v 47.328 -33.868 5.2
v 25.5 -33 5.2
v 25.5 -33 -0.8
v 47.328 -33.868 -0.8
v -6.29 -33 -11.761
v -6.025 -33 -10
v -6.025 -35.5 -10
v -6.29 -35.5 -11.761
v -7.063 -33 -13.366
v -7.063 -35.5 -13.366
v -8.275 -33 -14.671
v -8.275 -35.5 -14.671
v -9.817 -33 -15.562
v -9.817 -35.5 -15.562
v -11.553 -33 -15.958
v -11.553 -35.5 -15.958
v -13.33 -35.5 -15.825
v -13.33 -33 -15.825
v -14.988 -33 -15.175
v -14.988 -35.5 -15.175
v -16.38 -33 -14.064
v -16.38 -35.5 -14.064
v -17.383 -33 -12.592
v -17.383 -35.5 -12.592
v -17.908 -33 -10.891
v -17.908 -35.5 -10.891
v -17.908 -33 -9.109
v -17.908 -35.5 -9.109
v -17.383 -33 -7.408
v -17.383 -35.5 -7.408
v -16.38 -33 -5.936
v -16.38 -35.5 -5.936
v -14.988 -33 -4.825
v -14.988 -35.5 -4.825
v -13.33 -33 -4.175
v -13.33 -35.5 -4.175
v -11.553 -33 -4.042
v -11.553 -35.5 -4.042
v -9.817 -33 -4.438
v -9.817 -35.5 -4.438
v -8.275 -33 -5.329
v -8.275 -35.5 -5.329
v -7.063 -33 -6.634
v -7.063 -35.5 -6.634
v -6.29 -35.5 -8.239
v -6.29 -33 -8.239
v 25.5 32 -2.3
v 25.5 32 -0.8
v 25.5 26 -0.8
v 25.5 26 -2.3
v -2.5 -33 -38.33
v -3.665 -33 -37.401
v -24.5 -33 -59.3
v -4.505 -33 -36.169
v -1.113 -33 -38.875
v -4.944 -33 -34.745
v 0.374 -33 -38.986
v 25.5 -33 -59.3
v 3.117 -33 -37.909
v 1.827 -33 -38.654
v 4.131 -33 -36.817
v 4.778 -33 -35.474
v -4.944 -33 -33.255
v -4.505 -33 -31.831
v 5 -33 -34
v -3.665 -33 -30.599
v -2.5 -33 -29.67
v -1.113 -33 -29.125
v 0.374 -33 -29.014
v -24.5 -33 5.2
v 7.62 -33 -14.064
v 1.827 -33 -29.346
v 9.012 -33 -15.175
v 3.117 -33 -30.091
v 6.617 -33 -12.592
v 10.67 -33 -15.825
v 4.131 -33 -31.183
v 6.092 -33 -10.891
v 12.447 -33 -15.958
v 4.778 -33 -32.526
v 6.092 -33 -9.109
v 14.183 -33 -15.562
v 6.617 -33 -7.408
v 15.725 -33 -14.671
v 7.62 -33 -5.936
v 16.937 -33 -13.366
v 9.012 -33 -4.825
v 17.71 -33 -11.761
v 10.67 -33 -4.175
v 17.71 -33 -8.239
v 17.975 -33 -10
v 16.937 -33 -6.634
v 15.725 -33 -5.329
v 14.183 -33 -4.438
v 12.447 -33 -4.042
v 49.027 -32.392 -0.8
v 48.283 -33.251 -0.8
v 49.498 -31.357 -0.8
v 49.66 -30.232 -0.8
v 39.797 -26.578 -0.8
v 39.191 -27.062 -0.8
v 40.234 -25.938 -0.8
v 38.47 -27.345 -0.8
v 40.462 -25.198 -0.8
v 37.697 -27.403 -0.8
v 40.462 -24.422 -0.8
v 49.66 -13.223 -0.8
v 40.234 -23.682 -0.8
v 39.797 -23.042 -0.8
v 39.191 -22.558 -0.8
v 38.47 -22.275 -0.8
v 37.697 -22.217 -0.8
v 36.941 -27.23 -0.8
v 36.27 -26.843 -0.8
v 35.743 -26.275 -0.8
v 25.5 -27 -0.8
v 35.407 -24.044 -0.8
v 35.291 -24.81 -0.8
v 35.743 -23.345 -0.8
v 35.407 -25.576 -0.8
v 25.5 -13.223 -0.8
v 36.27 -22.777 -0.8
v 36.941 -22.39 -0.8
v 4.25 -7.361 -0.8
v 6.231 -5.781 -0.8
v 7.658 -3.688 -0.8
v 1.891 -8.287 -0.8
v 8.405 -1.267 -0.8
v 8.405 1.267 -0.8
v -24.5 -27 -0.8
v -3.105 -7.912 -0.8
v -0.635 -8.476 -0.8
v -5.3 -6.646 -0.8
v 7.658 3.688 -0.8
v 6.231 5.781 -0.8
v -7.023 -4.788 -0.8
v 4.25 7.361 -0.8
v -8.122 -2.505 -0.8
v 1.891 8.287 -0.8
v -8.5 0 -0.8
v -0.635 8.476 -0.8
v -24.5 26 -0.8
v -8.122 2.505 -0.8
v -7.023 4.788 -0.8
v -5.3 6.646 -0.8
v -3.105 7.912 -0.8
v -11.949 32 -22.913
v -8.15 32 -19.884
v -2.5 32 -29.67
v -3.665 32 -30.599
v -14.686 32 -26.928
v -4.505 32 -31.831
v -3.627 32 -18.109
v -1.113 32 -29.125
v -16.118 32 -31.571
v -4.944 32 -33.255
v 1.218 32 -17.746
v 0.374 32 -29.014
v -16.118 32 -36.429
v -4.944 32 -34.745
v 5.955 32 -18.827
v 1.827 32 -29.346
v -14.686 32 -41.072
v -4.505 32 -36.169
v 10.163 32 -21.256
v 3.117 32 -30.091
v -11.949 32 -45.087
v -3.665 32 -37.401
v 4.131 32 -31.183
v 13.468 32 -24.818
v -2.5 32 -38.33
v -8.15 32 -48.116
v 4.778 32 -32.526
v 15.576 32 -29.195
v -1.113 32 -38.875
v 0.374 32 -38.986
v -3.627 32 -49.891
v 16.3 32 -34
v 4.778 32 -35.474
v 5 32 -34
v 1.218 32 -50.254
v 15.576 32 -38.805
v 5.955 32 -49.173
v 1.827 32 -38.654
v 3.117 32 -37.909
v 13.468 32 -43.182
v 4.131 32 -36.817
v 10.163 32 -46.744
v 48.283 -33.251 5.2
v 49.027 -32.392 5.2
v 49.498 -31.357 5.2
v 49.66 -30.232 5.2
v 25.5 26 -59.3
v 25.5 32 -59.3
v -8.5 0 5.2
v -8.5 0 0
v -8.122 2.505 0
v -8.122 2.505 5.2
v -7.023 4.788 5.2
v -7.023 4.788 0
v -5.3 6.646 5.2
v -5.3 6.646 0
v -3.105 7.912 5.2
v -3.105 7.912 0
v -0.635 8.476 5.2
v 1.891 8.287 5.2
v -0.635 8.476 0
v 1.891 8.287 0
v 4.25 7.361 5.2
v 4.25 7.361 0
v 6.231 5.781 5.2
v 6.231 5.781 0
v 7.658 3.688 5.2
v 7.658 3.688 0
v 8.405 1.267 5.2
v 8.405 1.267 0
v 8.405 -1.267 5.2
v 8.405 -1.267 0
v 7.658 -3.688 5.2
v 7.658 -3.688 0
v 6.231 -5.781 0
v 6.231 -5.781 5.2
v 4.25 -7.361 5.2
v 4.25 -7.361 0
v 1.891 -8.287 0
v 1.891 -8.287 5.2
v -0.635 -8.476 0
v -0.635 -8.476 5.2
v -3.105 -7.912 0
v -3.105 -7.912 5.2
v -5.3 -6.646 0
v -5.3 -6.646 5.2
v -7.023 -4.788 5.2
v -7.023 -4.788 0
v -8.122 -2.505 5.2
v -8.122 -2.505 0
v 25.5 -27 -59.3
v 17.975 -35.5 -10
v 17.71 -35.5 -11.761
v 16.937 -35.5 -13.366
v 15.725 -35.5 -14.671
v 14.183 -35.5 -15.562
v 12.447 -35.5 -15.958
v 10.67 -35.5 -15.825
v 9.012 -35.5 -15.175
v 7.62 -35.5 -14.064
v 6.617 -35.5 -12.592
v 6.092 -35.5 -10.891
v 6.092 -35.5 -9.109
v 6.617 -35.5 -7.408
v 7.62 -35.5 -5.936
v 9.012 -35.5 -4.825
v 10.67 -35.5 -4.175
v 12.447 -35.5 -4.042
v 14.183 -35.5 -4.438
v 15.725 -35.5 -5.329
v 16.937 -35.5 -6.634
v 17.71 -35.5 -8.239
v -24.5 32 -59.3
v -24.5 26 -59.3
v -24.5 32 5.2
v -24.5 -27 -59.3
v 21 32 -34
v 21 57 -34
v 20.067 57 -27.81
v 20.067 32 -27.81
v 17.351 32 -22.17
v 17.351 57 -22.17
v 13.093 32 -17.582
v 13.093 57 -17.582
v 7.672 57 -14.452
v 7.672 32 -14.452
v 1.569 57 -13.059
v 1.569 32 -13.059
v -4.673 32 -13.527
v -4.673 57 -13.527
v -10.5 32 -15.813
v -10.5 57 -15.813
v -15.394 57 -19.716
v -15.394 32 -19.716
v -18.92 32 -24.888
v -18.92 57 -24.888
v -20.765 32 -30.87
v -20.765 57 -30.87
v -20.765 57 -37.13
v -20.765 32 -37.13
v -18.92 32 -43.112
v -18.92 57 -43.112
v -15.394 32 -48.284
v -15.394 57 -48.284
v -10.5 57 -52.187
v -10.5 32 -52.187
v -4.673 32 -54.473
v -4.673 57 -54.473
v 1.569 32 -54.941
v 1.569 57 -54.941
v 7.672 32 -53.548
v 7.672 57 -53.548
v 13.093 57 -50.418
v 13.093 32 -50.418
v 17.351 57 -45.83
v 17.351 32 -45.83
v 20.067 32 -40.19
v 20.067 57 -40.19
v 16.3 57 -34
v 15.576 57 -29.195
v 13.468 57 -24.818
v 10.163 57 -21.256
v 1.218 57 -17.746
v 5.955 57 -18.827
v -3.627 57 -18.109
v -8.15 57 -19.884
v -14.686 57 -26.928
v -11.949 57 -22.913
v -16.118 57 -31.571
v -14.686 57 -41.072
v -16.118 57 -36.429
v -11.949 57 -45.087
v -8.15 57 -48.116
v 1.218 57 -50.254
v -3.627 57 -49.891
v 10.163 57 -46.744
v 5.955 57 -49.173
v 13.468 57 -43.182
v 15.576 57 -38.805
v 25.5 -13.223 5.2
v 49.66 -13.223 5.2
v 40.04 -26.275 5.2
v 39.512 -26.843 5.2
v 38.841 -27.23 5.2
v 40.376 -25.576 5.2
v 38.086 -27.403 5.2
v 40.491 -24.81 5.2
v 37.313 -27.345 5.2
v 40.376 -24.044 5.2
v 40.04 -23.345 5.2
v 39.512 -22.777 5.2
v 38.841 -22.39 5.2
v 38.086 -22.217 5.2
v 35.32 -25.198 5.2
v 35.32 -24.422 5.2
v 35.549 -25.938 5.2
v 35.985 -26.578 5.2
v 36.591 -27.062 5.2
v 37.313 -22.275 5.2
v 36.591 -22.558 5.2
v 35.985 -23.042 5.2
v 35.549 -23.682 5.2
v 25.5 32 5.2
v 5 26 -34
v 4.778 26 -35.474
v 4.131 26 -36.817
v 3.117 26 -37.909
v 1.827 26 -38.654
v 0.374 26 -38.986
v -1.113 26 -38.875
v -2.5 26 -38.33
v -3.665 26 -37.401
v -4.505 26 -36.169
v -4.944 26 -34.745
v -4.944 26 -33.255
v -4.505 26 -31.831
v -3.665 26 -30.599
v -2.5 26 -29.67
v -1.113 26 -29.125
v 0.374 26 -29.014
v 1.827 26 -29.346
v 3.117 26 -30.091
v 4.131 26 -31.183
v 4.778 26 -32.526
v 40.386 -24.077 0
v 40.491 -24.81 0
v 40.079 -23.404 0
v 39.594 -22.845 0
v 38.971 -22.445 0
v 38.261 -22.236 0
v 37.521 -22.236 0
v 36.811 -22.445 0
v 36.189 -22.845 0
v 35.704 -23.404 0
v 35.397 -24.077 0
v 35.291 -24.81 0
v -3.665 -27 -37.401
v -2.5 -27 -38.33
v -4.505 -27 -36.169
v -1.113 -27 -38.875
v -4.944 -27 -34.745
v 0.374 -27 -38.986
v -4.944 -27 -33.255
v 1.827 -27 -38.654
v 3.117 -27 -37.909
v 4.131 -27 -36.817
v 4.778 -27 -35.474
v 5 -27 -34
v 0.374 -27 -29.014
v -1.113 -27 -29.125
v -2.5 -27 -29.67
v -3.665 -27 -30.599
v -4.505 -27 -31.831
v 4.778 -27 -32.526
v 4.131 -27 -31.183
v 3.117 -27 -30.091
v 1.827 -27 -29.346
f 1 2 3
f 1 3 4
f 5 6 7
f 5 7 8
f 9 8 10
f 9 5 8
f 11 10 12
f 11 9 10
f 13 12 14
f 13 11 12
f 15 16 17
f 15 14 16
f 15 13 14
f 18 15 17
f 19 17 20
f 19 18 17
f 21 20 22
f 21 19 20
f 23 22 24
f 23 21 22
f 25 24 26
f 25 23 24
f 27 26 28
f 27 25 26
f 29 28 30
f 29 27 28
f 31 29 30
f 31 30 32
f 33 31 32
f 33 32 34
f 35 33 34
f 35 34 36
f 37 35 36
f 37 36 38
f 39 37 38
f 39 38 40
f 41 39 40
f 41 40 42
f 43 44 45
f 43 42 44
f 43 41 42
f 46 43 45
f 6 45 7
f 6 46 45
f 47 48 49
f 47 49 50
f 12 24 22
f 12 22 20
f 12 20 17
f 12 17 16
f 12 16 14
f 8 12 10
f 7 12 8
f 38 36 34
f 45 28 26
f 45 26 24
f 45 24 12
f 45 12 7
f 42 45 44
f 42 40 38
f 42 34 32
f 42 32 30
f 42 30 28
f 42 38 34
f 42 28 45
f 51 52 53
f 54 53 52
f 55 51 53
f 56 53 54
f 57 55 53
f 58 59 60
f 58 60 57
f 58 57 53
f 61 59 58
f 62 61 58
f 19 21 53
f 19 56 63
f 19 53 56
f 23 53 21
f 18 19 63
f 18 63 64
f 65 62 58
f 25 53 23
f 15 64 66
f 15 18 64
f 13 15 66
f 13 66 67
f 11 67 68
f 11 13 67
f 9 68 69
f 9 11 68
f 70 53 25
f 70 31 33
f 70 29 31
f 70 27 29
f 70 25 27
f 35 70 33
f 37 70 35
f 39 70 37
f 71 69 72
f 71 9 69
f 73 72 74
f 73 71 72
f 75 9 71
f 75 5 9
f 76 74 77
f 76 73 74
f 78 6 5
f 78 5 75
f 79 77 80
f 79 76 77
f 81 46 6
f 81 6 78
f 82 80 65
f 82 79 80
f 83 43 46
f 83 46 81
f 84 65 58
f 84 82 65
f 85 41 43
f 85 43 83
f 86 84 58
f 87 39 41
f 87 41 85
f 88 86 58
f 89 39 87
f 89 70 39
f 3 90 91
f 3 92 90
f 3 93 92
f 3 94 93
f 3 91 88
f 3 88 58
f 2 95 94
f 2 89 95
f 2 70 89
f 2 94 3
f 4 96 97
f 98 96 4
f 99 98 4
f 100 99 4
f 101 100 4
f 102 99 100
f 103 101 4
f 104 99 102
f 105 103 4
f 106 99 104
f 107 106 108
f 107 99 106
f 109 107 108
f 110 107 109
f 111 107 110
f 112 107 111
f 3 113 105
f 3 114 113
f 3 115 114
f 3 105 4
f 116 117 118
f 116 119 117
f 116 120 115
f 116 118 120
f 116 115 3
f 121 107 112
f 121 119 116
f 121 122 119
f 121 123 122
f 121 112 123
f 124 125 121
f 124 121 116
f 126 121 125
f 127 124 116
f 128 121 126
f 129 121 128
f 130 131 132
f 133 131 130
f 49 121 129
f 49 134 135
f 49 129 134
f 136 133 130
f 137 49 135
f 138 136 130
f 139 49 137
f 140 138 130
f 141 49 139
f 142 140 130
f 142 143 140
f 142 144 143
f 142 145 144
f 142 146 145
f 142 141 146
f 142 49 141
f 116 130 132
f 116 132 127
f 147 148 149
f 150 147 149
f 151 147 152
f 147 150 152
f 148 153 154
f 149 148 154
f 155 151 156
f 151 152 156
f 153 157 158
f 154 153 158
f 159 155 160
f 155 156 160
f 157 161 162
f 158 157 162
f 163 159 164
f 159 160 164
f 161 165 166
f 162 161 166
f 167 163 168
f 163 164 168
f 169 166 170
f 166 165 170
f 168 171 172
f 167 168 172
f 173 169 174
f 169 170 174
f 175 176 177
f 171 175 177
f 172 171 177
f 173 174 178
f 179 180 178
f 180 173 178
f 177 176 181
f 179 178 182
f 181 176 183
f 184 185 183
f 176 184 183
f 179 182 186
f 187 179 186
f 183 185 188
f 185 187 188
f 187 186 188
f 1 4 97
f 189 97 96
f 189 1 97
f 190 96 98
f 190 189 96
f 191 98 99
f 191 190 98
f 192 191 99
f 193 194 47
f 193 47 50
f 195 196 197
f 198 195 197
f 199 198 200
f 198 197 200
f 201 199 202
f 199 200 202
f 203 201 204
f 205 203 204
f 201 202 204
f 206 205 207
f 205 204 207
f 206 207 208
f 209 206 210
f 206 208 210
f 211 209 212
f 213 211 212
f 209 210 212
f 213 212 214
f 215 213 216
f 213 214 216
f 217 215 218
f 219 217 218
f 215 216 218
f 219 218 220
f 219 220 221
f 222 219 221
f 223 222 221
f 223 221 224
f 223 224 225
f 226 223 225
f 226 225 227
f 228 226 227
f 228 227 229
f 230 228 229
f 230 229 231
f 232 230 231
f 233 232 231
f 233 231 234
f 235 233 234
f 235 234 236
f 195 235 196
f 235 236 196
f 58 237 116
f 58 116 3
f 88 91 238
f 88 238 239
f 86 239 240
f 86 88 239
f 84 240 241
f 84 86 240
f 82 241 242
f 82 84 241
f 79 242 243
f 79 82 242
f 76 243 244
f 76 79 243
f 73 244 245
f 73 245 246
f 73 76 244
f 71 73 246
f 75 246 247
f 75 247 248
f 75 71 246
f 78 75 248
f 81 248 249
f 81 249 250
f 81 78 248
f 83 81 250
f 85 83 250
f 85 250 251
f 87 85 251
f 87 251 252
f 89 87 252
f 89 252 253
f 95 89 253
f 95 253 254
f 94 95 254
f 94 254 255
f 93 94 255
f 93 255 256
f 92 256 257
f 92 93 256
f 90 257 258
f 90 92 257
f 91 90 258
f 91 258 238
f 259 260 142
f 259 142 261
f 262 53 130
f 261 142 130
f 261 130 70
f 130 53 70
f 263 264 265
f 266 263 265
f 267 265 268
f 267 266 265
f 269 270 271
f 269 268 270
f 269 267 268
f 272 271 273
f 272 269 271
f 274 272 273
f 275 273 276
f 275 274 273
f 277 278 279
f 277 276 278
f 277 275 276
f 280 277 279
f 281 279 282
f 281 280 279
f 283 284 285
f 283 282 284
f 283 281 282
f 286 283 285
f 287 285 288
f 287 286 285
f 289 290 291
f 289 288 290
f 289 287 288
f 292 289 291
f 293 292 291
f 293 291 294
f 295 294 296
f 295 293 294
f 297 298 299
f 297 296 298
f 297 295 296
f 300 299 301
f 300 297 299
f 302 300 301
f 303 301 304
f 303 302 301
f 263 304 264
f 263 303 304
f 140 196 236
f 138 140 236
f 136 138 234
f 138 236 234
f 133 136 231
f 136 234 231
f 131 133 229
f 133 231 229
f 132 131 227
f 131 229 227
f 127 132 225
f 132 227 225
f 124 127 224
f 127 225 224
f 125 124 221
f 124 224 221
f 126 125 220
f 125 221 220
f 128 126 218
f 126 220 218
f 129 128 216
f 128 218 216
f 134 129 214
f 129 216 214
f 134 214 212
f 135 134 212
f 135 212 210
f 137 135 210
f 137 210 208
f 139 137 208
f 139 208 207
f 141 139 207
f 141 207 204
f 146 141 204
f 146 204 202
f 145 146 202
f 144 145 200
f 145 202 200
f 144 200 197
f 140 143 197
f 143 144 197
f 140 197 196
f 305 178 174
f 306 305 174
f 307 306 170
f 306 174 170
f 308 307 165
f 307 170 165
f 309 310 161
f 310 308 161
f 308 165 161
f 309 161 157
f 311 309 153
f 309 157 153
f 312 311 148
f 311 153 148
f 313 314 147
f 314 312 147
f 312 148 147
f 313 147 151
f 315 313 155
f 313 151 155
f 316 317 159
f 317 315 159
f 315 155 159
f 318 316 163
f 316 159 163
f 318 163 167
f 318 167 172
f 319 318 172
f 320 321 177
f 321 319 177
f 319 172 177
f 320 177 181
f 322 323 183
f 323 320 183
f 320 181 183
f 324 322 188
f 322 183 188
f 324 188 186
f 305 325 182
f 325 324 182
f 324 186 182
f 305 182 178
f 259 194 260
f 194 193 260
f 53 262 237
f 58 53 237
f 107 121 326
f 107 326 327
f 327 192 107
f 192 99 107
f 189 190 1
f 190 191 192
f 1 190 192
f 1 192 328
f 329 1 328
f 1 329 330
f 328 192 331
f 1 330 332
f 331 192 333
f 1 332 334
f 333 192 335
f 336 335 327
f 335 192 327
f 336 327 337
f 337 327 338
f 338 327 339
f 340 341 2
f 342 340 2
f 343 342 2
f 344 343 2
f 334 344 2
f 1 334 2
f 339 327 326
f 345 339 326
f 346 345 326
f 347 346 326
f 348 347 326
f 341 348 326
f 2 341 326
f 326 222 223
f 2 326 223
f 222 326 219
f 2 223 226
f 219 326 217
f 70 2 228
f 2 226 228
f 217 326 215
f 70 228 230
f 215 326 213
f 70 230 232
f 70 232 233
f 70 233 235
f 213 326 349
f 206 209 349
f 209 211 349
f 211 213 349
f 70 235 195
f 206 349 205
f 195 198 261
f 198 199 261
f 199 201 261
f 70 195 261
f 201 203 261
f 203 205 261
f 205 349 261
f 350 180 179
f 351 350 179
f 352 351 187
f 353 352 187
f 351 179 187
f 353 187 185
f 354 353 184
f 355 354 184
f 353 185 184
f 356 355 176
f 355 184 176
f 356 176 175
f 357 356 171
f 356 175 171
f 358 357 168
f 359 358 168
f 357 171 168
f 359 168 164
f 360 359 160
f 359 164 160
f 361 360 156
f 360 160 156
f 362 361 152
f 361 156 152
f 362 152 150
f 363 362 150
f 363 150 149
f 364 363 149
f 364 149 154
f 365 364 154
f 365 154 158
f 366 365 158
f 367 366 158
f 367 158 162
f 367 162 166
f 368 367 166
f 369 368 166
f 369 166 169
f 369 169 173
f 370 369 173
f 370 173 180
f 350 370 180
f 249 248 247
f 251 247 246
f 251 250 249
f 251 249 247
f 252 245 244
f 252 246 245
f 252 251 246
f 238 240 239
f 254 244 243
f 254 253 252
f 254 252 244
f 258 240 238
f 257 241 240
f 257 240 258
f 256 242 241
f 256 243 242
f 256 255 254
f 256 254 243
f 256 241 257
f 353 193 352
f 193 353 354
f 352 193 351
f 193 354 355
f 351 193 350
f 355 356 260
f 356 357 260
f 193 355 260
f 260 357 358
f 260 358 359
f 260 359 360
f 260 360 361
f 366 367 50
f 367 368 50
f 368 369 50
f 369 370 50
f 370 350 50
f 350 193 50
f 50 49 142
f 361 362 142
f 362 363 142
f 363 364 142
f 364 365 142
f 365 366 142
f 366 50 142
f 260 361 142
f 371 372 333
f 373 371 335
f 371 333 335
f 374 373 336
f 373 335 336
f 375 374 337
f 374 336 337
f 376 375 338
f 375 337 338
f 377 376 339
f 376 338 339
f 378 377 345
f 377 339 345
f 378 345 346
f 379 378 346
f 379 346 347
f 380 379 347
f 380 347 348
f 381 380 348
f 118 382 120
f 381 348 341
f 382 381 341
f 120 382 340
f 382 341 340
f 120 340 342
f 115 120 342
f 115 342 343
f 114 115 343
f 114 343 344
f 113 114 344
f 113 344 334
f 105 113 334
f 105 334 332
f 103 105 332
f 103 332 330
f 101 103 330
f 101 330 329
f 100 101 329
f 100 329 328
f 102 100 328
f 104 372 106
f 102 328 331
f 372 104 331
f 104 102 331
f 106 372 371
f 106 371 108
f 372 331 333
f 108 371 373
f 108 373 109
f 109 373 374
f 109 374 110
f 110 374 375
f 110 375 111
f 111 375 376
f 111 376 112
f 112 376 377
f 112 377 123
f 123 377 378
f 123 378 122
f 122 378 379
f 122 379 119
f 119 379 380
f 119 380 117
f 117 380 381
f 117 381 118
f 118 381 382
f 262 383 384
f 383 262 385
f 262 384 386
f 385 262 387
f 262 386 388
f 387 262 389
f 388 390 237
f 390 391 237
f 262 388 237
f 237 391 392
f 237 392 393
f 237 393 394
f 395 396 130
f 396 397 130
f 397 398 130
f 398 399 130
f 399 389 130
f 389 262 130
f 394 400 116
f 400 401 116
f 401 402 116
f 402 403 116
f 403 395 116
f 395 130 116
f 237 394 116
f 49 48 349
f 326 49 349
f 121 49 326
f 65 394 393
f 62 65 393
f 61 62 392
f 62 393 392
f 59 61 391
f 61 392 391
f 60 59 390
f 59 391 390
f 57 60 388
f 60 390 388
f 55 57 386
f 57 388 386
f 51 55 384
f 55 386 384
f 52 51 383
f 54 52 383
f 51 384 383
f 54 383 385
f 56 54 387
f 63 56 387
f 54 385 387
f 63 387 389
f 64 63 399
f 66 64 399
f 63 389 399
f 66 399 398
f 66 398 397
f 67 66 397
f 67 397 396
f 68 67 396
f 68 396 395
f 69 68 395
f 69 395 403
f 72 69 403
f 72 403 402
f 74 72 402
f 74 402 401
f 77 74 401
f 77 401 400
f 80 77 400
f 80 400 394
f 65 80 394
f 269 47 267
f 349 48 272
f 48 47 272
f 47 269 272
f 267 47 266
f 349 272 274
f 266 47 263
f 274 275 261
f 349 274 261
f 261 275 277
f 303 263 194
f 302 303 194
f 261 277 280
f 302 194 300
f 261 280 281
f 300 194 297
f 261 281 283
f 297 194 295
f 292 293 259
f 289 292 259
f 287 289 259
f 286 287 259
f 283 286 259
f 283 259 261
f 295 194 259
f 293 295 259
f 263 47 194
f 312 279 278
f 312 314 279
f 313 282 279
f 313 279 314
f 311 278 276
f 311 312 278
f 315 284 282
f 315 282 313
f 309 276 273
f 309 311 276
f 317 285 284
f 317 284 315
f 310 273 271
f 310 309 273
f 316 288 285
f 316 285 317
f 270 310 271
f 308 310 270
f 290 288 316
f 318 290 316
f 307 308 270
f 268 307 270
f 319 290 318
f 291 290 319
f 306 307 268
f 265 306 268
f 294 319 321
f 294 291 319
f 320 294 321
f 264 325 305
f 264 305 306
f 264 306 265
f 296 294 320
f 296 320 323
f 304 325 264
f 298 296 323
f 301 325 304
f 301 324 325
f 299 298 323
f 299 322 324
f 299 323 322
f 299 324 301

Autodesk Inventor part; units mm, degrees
sketch "Sketch1" plane through (0, 0, 0) normal (0, 0, 1) x (1, 0, 0)
  line L0 (25.5, -27) -> (-25.5, -27)
  line L1 (-25.5, -27) -> (-25.5, 27)
  line L2 (-25.5, 27) -> (25.5, 27)
  line L3 (25.5, 27) -> (25.5, -27)
  line L4 (25.5, -27) -> (-25.5, 27) construction
  line L5 (-25.5, -27) -> (25.5, 27) construction
  point P0 (0, 0)
  dimension "d0" = 51
  dimension "d1" = 54
extrude "Extrusion1" add sketch "Sketch1" along normal blind 6
sketch "Sketch2" plane through (0, 0, 6) normal (0, 0, 1) x (1, 0, 0)
  circle A0 centre (0, 0) radius 15
  dimension "d4" = 30
sketch "Sketch4" plane through (0, 0, 6) normal (0, 0, 1) x (1, 0, 0)
  line L0 (-25.5, 27) -> (26.5, 27)
  line L1 (-25.5, -27) -> (25.5, -27) projected
  line L2 (25.5, -27) -> (-25.5, -27)
  line L3 (-25.5, -27) -> (-25.5, -33)
  line L4 (-25.5, -33) -> (25.5, -33)
  line L5 (25.5, -33) -> (25.5, -27)
  point P0 (0, 0)
  dimension "d109" = 51
  dimension "d110" = 6
extrude "Extrusion4" add sketch "Sketch4" against normal blind 65.3
ref_plane "Plano de trabajo8" through (25.5, -33.8, -42) normal (1, 0, 0) x (0, 0, -1)
ref_plane "Work Plane9" through (-10.5, -27, -57) normal (0, 1, 0) x (1, 0, 0)
sketch "Sketch25" plane through (-10.5, -27, -57) normal (0, 1, 0) x (1, 0, 0)
  line L0 (0, 0) -> (21, 0) projected
  line L1 (10.5, 0) -> (10.5, -23)
  circle A0 centre (10.5, -23) radius 5
  line L2 (10.5, -23) -> (10.5, -63)
  line L3 (36, -63) -> (-15, -63) projected
  point P0 (10.5, -57)
  dimension "d111" = 23
  dimension "d112" = 10
extrude "Extrusion22" cut sketch "Sketch25" against normal blind 68
ref_plane "Work Plane7" through (-10.5, -0.5, -57) normal (0, 1, 0) x (1, 0, 0)
mirror "Mirror2" about plane through (-10.5, -0.5, -57) normal (0, 1, 0) of "Extrusion4"
extrude "Extrusión28" cut sketch "Sketch2" against normal blind 10
ref_plane "Work Plane10" through (25.5, -34, -42) normal (1, 0, 0) x (0, 0, -1)
ref_plane "Work Plane11" through (-25.5, -87, 1.3) normal (0, 1, 0) x (1, 0, 0)
sketch "Sketch37" plane through (-25.5, 32, 6) normal (0, 1, 0) x (1, 0, 0)
  circle A0 centre (25.5, 40) radius 5 projected
  point P0 (25.5, 6)
extrude "Extrusion33" cut sketch "Sketch37" against normal blind 68
sketch "Sketch43" plane through (0, 0, 6) normal (0, 0, 1) x (1, 0, 0)
  circle A0 centre (0, 0) radius 10.4895
  circle A1 centre (0, 0) radius 15 projected
  circle A2 centre (0, 0) radius 5
  dimension "d182" = 10
extrude "Extrusion40" add sketch "Sketch43" against normal blind 8.3 contours A0 | A1
sketch "Boceto48" plane through (-25.5, -33, 6) normal (0, -1, 0) x (1, 0, 0)
  point P0 (25.5, -6)
sketch "Boceto49" plane through (-25.5, -33, 6) normal (0, -1, 0) x (1, 0, 0)
  point P0 (25.5, -6)
sketch "Boceto50" plane through (25.5, 26, -59.3) normal (0, 0, -1) x (-1, 0, 0)
  point P0 (25.5, -26)
sketch "Boceto77" plane through (0, 0, 6) normal (0, 0, 1) x (1, 0, 0)
  point P0 (0, 0)
sketch "Boceto84" plane through (25.5, -33, -59.3) normal (1, 0, 0) x (0, 0, -1)
  line L0 (-65.3, 0) -> (-65.3, 65) projected
  line L1 (-65.3, 0) -> (-65.3, 32.3804)
  line L2 (-65.3, 32.3804) -> (-80.5662, 32.3804)
  line L3 (-80.5662, 32.3804) -> (-80.5662, -6.9517)
  line L4 (-80.5662, -6.9517) -> (-65.3, -6.9517)
  line L5 (-65.3, -6.9517) -> (-65.3, 0)
  point P0 (-59.3, 33)
  point P1 (-65.3, 66.9563)
  point P2 (-65.3, 65.9563)
extrude "Extrusión80" cut sketch "Boceto84" along normal mid plane 100
sketch "Boceto85" plane through (0, 0, 0) normal (0, 0, -1) x (-1, 0, 0)
  line L0 (-25.5, -33) -> (-25.5, -4.0448)
  line L1 (-25.5, -27) -> (-25.5, 26) projected
  line L2 (-25.5, -4.0448) -> (-53.9802, -4.6672)
  line L3 (-53.9802, -4.6672) -> (-54.6281, -33.6366)
  line L4 (-54.6281, -33.6366) -> (-25.5, -33)
  point P0 (0, 0)
  point P1 (-25.5, -13.7947)
extrude "Extrusión81" cut sketch "Boceto85" along normal mid plane 100
sketch "Boceto90" plane through (0, 0, 6) normal (0, 0, 1) x (1, 0, 0)
  circle A0 centre (0, 0) radius 5.2249
  circle A1 centre (0, 0) radius 14.4421
extrude "Extrusión86" add sketch "Boceto90" along normal blind 4.7
fillet "Empalme20" radius 2 1 edges at (-14.4421, 0, 6)
sketch "Boceto91" plane through (0, 0, 0) normal (0, 0, -1) x (-1, 0, 0)
  point P0 (0, 0)
sketch "Boceto92" plane through (0, 0, 0) normal (0, 0, -1) x (-1, 0, 0)
  point P0 (0, 0)
sketch "Boceto93" plane through (0, 0, 0) normal (0, 0, -1) x (-1, 0, 0)
  line L0 (-25.5, -27) -> (-25.5, 26) projected
  line L1 (-25.5, 1.3668) -> (-41.5813, 1.3668)
  line L2 (-41.5813, 1.3668) -> (-41.5813, -33)
  line L3 (-25.5, -33) -> (-41.5813, -33)
  line L4 (-25.5, -33) -> (-25.5, 32.9563) projected
  line L5 (-25.5, 1.3668) -> (-25.5, -33)
  point P0 (0, 0)
extrude "Extrusión87" add sketch "Boceto93" against normal blind 8.3
sketch "Boceto94" plane through (0, 0, 6) normal (0, 0, 1) x (1, 0, 0)
  line L0 (41.5813, -33) -> (41.5813, 1.3668) projected
  line L1 (41.5813, 1.3668) -> (41.5813, 35.5236)
  line L2 (-25.5, 32.9563) -> (25.5, 32.9563) projected
  line L3 (25.5, 32.9563) -> (41.5813, 32.9563)
  line L4 (25.5, 32.9563) -> (25.5, 1.3668)
  line L5 (25.5, 1.3668) -> (41.5813, 1.3668)
  point P0 (0, 0)
extrude "Extrusión88" add sketch "Boceto94" against normal blind 8.3
sketch "Boceto95" plane through (0, 0, 6) normal (0, 0, 1) x (1, 0, 0)
  circle A0 centre (37.8913, -24.81) radius 2.6
  line L0 (35.2913, -24.81) -> (37.8913, -24.81)
  point P0 (0, 0)
  point P1 (41.5813, -33)
  dimension "d305" = 5.2
extrude "Extrusión89" cut sketch "Boceto95" against normal blind 8.3
sketch "Boceto97" plane through (-25.5, -33, -59.3) normal (-1, 0, 0) x (0, 0, 1)
  line L0 (59.3, 0) -> (67.6, 0) projected
  line L1 (67.6, 0) -> (89.1392, 0)
  line L2 (89.1392, 0) -> (89.1392, 69.8717)
  line L3 (89.1392, 69.8717) -> (67.6, 69.8717)
  line L4 (67.6, 69.8717) -> (67.6, 0)
  point P0 (59.3, 33)
extrude "Extrusión92" cut sketch "Boceto97" against normal blind 1000
sketch "Boceto98" plane through (-25.5, -33, -59.3) normal (-1, 0, 0) x (0, 0, 1)
  line L0 (59.3, 59) -> (59.3, 6) projected
  line L1 (59.3, 59) -> (58.3, 59) projected
  line L2 (59.3, 6) -> (59.3, 59)
  line L3 (59.3, 59) -> (56.1979, 59)
  line L4 (59.3, 59) -> (0, 59) projected
  line L5 (56.1979, 59) -> (56.1979, 6)
  line L6 (59.3, 6) -> (0, 6) projected
  line L7 (56.1979, 6) -> (59.3, 6)
  line L8 (65.3, 65) -> (0, 65) projected
  line L9 (56.1979, 65) -> (56.1979, 67.4992)
  line L10 (56.1979, 67.4992) -> (67.7631, 67.4992)
  line L11 (67.7631, 67.4992) -> (76.364, 67.4992)
  line L12 (76.364, 67.4992) -> (76.364, -7.6447)
  line L13 (65.3, 0) -> (65.3, 34.3668) projected
  line L14 (65.3, 0) -> (65.3, -7.6447)
  line L15 (65.3, -7.6447) -> (76.364, -7.6447)
  line L16 (65.3, 0) -> (65.3, 65)
  line L17 (65.3, 0) -> (65.3, 65) projected
  line L18 (56.1979, 65) -> (65.3, 65)
  point P0 (59.3, 33)
  point P1 (59.3, 51.8098)
  point P2 (58.3, 65)
  point P3 (65.3, 65.9563)
  point P4 (59.3, 51.8098)
  point P5 (58.3, 65)
  point P6 (65.3, 34.3668)
extrude "Extrusión93" cut sketch "Boceto98" along normal mid plane 1000
sketch "Boceto99" plane through (41.5813, -33, 0) normal (1, 0, 0) x (0, 0, -1)
  line L0 (0, 58.9816) -> (2.3, 58.9816)
  line L1 (2.3, 65) -> (2.3, 59) projected
  line L2 (2.3, 58.9816) -> (2.3, 65)
  line L3 (2.3, 65) -> (2.3, 58.9816)
  line L4 (2.3, 65) -> (0, 65)
  line L5 (-6, 65) -> (59.3, 65) projected
  line L6 (0, 58.9816) -> (0, 65)
  point P0 (0, 33)
extrude "Extrusión94" cut sketch "Boceto99" against normal blind 16.081
sketch "Boceto100" plane through (25.5, 26, -59.3) normal (0, 0, -1) x (-1, 0, 0)
  line L0 (-16.0813, 6) -> (-0.0003, 6) projected
  line L1 (0, 0) -> (-16.0813, 0)
  line L2 (-16.0813, 0) -> (-16.0813, 6)
  line L3 (-16.0813, 6) -> (0, 6)
  line L4 (0, 6) -> (0, 0)
  point P0 (25.5, -26)
  point P1 (-0.0003, 6)
extrude "Extrusión95" cut sketch "Boceto100" against normal blind 59.3
sketch "Boceto101" plane through (0, 0, 0) normal (0, 0, -1) x (-1, 0, 0)
  circle A0 centre (0, 0) radius 8.5
  dimension "d322" = 17
extrude "Extrusión96" cut sketch "Boceto101" against normal blind 59.3
sketch "Boceto102" plane through (-25.5, 32, -59.3) normal (0, 1, 0) x (1, 0, 0)
  circle A0 centre (25.5, -25.3) radius 5 projected
  circle A1 centre (25.5, -25.3) radius 16.3
  circle A2 centre (25.5, -25.3) radius 21
  point P0 (25.5, -59.3)
  dimension "d325" = 32.6
  dimension "d326" = 42
extrude "Extrusión97" add sketch "Boceto102" along normal blind 25 contours A2
sketch "Boceto103" plane through (-25.5, -27, -59.3) normal (0, 1, 0) x (1, 0, 0)
  point P0 (25.5, -59.3)
sketch "Boceto104" plane through (0, 0, 6) normal (0, 0, 1) x (1, 0, 0)
  line L0 (-25.5, -33) -> (-25.5, 32) projected
  line L1 (41.5813, 32) -> (41.5813, -33) projected
  line L2 (-25.5, 32) -> (41.5813, 32)
  line L3 (41.5813, 32) -> (41.5813, -33)
  line L4 (41.5813, -33) -> (-25.5, -33)
  line L5 (-25.5, -33) -> (-25.5, 32)
  point P0 (0, 0)
extrude "Extrusión98" cut sketch "Boceto104" against normal blind 0.8
sketch "Boceto105" plane through (0, 0, 0) normal (0, 0, -1) x (-1, 0, 0)
  line L0 (-25.5, -33) -> (25.5, -33) projected
  line L1 (-41.5813, 32) -> (25.5, 32)
  line L2 (25.5, 32) -> (25.5, -33)
  line L3 (25.5, -33) -> (-41.5813, -33)
  line L4 (-41.5813, -33) -> (-41.5813, 32)
  circle A0 centre (-37.8913, -24.81) radius 2.6 projected
  circle A1 centre (-37.8913, -24.81) radius 2.6
  circle A2 centre (0, 0) radius 8.5
extrude "Extrusión99" add sketch "Boceto105" along normal blind 0.8
sketch "Boceto106" plane through (-25.5, -33, -59.3) normal (0, -1, 0) x (1, 0, 0)
  line L0 (0, 0) -> (51, 0) projected
  line L1 (67.0813, 64.5) -> (0, 64.5) projected
  line L2 (0, 0) -> (1, 0)
  line L3 (1, 0) -> (1, 64.5)
  line L4 (1, 64.5) -> (0, 64.5)
  line L5 (0, 64.5) -> (0, 0)
  point P0 (25.5, 59.3)
  point P1 (0, 64.5)
  point P2 (1, 0)
  dimension "d333" = 1
extrude "Extrusión100" cut sketch "Boceto106" against normal blind 1000
sketch "Boceto107" plane through (0, 0, -0.8) normal (0, 0, -1) x (-1, 0, 0)
  line L0 (-25.5, -33) -> (-25.5, -38.9196)
  line L1 (-25.5, -38.9196) -> (-33.0828, -52.767)
  line L2 (-33.0828, -52.767) -> (-34.3078, -45.7968) construction
  line L3 (-41.5813, -33) -> (24.5, -33) projected
  spline S0 degree 3 poles (-33.0828, -52.767) (-34.3078, -45.7968) (-36.0426, -41.6296) (-38.17, -38.0712) knots 1 1 1 1 1.670244 1.670244 1.670244 1.670244
  line L4 (-41.5813, 32) -> (-41.5813, -33) projected
  line L5 (-37.8729, -38.2076) -> (-46.4829, -34.2556)
  line L6 (-46.4829, -34.2556) -> (-46.4829, 32)
  line L7 (-46.4829, 32) -> (-41.5813, 32)
  line L8 (-34.3078, -45.7968) -> (-36.0426, -41.6296) construction
  line L9 (-36.0426, -41.6296) -> (-38.17, -38.0712) construction
  point P0 (0, 0)
extrude "Extrusión101" add sketch "Boceto107" against normal blind 6
fillet "Empalme21" radius 2 2 edges at (38.17, -38.0712, 2.2) (46.4829, -34.2556, 2.2)
sketch "Boceto108" plane through (-24.5, -33, 5.2) normal (0, -1, 0) x (1, 0, 0)
  circle A0 centre (24.5, -39.2) radius 5 projected
  line L0 (24.5, -39.2) -> (24.5, -15.2)
  line L1 (50, -6) -> (0, -6) projected
  line L2 (24.5, -15.2) -> (32.2045, -6)
  line L3 (32.2045, -6) -> (24.5, -15.2)
  line L4 (24.5, -15.2) -> (36.5, -15.2)
  line L5 (36.5, -15.2) -> (12.5, -15.2)
  circle A1 centre (36.5, -15.2) radius 5.975
  circle A2 centre (12.5, -15.2) radius 5.975
  point P0 (24.5, -5.2)
  dimension "d340" = 24
  dimension "d341" = 12
  dimension "d342" = 12
  dimension "d343" = 24
  dimension "d344" = 11.95
  dimension "d345" = 11.95
extrude "Extrusión102" add sketch "Boceto108" along normal blind 2.5 contours A1 | A2
sketch "Boceto109" plane through (0, 0, -0.8) normal (0, 0, -1) x (-1, 0, 0)
  line L0 (-45.3172, -34.7906) -> (-38.7421, -37.8086) projected
  line L1 (-45.3172, -34.7906) -> (-49.6596, -32.7974)
  line L2 (-49.6596, -32.7974) -> (-49.6596, 32)
  line L3 (-46.4829, 32) -> (-46.4829, -32.9729) projected
  line L4 (-49.6596, 32) -> (-46.4829, 32)
  arc A0 (-46.4829, -32.9729) -> (-45.3172, -34.7906) centre (-44.4829, -32.9729) ccw projected
  line L5 (-46.4829, 32) -> (-45.3172, -34.7906)
  point P0 (0, 0)
extrude "Extrusión103" add sketch "Boceto109" against normal blind 6 contours L1 L2 L4 L3 A0
fillet "Empalme23" radius 4 2 edges at (49.6596, -32.7974, 2.2) (49.6596, 32, 2.2)
sketch "Boceto110" plane through (0, 0, 5.2) normal (0, 0, 1) x (1, 0, 0)
  line L0 (33.0828, -52.767) -> (25.5, -38.9196) projected
  line L1 (25.5, -38.9196) -> (37.9157, -38.9196)
  line L2 (37.9157, -38.9196) -> (33.0828, -52.767)
  line L3 (33.0828, -52.767) -> (25.5, -38.9196)
  point P0 (0, 0)
extrude "Extrusión104" cut sketch "Boceto110" against normal blind 10
sketch "Sketch111" plane through (0, 0, 5.2) normal (0, 0, 1) x (1, 0, 0)
  line L0 (25.5, -33) -> (25.5, -38.9196) projected
  line L1 (38.7421, -37.8086) -> (47.3283, -33.8675) projected
  line L2 (25.5, -33) -> (47.3283, -33.8675)
  line L3 (37.6774, -38.9196) -> (25.5, -38.9196) projected
  line L4 (25.5, -38.9196) -> (37.6774, -38.9196)
  line L5 (37.6774, -38.9196) -> (38.7421, -37.8086)
  point P0 (0, 0)
extrude "Extrusion105" cut sketch "Sketch111" against normal blind 10
sketch "Sketch114" plane through (0, 0, -0.8) normal (0, 0, -1) x (-1, 0, 0)
  line L0 (-25.5, 32) -> (-25.5, 26) projected
  line L1 (-25.5, 26) -> (-25.5, 32)
  line L2 (-25.5, 32) -> (-25.5, -13.2226)
  line L3 (-25.5, -13.2226) -> (-49.6596, -13.2226)
  line L4 (-49.6596, -30.2322) -> (-49.6596, 28) projected
  line L5 (-49.6596, 28) -> (-49.6596, -30.2322) projected
  line L6 (-49.6596, -13.2226) -> (-49.6596, 28)
  line L7 (-25.5, 32) -> (-45.6596, 32) projected
  arc A0 (-45.6596, 32) -> (-49.6596, 28) centre (-45.6596, 28) ccw projected
  arc A1 (-45.6596, 32) -> (-49.6596, 28) centre (-45.6596, 28) ccw
  line L8 (-45.6596, 32) -> (-25.5, 32)
  point P0 (0, 0)
extrude "Extrusion108" cut sketch "Sketch114" against normal blind 6
sketch "Sketch115" plane through (0, 0, -59.3) normal (0, 0, -1) x (-1, 0, 0)
  line L0 (-50.9952, -38.1245) -> (29.0048, -38.1245)
  line L1 (29.0048, -38.1245) -> (29.0048, 81.8755)
  line L2 (29.0048, 81.8755) -> (-50.9952, 81.8755)
  line L3 (-50.9952, 81.8755) -> (-50.9952, -38.1245)
  point P0 (0, 0)
  dimension "d363" = 80
  dimension "d364" = 120
ref_plane "Work Plane3" through (-10.35, 26, -57) normal (0, 1, 0) x (1, 0, 0)
properties part number "C23[i3][L]" material "Aluminum 6061"
